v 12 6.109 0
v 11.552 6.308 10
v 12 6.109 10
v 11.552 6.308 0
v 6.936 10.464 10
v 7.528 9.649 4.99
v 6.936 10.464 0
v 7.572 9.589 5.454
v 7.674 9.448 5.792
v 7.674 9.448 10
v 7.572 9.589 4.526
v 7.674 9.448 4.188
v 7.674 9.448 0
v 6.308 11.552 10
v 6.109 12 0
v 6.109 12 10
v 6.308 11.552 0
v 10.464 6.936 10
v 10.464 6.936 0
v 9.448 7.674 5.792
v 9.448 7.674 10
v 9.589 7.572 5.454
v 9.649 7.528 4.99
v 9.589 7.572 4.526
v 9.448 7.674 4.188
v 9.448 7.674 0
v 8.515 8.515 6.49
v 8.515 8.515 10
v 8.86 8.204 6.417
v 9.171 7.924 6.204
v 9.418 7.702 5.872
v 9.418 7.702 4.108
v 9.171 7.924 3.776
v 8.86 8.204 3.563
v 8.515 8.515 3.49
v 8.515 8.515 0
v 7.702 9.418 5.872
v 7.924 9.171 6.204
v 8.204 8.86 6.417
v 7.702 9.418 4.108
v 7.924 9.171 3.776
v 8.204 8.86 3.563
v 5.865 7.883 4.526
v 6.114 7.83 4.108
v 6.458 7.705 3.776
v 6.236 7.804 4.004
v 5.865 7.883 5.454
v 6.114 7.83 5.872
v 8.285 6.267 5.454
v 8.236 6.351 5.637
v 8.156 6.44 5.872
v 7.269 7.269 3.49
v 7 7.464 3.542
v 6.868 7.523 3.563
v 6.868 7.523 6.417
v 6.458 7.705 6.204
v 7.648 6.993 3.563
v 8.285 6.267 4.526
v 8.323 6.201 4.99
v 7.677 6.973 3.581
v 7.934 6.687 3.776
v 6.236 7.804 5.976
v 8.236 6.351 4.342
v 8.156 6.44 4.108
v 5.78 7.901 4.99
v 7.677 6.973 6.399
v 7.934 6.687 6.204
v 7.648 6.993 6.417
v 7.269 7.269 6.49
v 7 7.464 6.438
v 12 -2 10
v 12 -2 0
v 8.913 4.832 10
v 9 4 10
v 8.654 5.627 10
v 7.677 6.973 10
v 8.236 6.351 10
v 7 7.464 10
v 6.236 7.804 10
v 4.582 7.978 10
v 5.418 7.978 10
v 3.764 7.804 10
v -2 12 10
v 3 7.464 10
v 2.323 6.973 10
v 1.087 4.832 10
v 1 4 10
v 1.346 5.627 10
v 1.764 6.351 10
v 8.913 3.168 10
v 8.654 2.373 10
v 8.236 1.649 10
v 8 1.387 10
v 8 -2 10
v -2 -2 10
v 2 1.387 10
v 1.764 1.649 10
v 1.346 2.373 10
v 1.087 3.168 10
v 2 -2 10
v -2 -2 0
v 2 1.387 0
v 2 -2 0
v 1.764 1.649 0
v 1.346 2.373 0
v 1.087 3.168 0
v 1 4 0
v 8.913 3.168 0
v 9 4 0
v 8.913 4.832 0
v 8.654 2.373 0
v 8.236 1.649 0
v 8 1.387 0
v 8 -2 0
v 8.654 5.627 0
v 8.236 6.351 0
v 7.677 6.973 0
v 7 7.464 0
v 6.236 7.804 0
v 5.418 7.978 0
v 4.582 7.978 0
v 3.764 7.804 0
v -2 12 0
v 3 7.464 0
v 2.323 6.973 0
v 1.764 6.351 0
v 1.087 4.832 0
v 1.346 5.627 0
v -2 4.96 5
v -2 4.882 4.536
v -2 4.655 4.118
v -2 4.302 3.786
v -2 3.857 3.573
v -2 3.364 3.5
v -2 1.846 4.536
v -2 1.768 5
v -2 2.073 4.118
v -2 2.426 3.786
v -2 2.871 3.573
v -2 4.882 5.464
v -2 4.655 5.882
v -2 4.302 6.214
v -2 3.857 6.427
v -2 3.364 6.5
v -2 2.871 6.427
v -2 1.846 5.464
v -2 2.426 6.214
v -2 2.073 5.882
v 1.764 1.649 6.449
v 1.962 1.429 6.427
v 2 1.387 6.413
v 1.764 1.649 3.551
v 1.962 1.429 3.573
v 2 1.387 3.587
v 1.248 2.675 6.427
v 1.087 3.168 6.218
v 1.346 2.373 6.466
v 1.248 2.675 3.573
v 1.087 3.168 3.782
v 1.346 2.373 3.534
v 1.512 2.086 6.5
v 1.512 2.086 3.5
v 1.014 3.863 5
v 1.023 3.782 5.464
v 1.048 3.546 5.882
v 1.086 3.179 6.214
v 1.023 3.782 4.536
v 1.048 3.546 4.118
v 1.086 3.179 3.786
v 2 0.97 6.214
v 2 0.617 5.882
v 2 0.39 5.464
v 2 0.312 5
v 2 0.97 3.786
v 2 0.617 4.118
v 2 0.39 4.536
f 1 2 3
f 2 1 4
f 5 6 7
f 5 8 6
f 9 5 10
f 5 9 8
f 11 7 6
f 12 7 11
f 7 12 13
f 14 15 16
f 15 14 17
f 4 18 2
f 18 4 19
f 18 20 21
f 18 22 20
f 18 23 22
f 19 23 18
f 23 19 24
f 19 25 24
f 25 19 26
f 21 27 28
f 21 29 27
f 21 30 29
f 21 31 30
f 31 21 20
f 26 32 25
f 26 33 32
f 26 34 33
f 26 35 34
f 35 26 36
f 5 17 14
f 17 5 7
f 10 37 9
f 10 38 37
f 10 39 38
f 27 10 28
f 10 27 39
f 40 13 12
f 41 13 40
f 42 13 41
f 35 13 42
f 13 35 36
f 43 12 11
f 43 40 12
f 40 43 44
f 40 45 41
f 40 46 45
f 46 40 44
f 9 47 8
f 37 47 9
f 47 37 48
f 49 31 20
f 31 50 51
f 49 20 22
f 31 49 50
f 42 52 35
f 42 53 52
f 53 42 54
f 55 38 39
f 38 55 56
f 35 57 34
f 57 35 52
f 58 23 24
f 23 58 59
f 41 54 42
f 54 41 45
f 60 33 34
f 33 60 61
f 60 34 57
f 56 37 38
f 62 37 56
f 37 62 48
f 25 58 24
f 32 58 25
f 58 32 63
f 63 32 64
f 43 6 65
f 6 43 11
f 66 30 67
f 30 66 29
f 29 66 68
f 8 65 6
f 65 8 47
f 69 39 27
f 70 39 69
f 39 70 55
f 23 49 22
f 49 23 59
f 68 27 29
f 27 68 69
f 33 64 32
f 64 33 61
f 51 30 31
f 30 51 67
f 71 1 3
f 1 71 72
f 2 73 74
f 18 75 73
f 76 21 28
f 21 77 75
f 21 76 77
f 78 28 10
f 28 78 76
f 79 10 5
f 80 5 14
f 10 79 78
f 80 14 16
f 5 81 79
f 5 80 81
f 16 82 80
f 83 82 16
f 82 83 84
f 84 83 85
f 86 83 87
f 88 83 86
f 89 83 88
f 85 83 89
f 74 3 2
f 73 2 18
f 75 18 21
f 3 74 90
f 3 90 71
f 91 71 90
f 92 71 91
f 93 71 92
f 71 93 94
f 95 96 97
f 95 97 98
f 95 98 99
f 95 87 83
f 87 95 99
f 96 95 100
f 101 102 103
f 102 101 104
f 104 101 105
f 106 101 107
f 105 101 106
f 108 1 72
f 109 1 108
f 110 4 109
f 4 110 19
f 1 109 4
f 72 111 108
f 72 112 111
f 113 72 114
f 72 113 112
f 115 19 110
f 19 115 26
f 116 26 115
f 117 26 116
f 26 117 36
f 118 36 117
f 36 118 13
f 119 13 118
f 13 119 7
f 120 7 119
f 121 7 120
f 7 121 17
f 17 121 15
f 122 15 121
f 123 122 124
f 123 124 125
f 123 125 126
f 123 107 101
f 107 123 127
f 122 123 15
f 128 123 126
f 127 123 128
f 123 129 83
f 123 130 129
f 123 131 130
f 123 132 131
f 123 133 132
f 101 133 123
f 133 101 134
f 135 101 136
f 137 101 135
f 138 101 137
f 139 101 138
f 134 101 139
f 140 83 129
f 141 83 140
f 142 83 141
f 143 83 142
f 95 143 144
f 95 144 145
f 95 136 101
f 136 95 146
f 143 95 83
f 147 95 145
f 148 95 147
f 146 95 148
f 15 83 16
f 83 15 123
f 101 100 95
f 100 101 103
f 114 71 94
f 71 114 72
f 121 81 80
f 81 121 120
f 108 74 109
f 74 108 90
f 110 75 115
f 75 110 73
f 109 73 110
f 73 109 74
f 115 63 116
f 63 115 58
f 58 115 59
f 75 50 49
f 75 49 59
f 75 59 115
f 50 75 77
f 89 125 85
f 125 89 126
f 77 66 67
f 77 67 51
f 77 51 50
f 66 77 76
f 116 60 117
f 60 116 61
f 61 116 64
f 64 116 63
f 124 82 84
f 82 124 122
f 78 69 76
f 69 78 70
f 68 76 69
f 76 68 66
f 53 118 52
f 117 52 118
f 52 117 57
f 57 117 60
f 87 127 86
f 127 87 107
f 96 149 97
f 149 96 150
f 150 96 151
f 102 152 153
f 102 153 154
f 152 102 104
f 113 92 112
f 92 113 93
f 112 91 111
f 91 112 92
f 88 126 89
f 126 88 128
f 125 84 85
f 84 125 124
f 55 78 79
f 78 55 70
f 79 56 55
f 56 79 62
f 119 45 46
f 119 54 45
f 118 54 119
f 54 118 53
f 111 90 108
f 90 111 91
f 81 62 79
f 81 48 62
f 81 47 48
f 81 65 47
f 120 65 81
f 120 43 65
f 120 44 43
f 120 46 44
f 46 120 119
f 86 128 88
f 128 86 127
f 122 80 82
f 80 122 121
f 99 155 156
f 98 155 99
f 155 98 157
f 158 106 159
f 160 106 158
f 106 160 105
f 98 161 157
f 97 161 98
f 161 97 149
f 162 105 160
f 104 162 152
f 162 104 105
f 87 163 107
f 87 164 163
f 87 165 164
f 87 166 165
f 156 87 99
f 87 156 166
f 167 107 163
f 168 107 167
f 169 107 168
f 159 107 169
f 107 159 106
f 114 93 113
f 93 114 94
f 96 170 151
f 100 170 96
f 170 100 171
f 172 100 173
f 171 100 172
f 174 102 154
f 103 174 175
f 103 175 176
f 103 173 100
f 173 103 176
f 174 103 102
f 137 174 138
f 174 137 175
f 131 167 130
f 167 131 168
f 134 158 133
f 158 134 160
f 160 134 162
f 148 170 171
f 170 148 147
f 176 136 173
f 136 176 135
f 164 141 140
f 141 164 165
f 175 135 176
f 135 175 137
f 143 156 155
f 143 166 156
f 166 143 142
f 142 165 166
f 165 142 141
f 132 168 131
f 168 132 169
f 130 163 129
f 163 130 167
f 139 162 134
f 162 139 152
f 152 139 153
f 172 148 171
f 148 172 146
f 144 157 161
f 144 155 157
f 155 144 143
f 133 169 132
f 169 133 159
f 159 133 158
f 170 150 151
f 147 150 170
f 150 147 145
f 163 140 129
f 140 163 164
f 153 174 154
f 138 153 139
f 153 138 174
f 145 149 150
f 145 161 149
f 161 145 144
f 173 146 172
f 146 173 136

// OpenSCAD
difference() {
  translate([-2,-2]) cube([14,14,10]);
  translate([5,4,-.01]) cylinder(d=8,h=10.02,$fn=30);
  translate([2,-2.01,-.01]) cube([6,5,10.02]);
  translate([5,0]) for(m=[0]) mirror([m,0]) translate([-5,0]) translate([17,17,-.01]) rotate([0,0,45]) {
    cylinder(d=24,h=10.02,$fn=60);
    translate([0,0,5]) rotate([0,90]) translate([0,0,-16]) cylinder(d=3,h=8,$fn=20);
  }
  translate([-1,3,5]) rotate([0,0,-20]) rotate([0,90]) translate([0,0,-3]) cylinder(d=3,h=7,$fn=20);
}
